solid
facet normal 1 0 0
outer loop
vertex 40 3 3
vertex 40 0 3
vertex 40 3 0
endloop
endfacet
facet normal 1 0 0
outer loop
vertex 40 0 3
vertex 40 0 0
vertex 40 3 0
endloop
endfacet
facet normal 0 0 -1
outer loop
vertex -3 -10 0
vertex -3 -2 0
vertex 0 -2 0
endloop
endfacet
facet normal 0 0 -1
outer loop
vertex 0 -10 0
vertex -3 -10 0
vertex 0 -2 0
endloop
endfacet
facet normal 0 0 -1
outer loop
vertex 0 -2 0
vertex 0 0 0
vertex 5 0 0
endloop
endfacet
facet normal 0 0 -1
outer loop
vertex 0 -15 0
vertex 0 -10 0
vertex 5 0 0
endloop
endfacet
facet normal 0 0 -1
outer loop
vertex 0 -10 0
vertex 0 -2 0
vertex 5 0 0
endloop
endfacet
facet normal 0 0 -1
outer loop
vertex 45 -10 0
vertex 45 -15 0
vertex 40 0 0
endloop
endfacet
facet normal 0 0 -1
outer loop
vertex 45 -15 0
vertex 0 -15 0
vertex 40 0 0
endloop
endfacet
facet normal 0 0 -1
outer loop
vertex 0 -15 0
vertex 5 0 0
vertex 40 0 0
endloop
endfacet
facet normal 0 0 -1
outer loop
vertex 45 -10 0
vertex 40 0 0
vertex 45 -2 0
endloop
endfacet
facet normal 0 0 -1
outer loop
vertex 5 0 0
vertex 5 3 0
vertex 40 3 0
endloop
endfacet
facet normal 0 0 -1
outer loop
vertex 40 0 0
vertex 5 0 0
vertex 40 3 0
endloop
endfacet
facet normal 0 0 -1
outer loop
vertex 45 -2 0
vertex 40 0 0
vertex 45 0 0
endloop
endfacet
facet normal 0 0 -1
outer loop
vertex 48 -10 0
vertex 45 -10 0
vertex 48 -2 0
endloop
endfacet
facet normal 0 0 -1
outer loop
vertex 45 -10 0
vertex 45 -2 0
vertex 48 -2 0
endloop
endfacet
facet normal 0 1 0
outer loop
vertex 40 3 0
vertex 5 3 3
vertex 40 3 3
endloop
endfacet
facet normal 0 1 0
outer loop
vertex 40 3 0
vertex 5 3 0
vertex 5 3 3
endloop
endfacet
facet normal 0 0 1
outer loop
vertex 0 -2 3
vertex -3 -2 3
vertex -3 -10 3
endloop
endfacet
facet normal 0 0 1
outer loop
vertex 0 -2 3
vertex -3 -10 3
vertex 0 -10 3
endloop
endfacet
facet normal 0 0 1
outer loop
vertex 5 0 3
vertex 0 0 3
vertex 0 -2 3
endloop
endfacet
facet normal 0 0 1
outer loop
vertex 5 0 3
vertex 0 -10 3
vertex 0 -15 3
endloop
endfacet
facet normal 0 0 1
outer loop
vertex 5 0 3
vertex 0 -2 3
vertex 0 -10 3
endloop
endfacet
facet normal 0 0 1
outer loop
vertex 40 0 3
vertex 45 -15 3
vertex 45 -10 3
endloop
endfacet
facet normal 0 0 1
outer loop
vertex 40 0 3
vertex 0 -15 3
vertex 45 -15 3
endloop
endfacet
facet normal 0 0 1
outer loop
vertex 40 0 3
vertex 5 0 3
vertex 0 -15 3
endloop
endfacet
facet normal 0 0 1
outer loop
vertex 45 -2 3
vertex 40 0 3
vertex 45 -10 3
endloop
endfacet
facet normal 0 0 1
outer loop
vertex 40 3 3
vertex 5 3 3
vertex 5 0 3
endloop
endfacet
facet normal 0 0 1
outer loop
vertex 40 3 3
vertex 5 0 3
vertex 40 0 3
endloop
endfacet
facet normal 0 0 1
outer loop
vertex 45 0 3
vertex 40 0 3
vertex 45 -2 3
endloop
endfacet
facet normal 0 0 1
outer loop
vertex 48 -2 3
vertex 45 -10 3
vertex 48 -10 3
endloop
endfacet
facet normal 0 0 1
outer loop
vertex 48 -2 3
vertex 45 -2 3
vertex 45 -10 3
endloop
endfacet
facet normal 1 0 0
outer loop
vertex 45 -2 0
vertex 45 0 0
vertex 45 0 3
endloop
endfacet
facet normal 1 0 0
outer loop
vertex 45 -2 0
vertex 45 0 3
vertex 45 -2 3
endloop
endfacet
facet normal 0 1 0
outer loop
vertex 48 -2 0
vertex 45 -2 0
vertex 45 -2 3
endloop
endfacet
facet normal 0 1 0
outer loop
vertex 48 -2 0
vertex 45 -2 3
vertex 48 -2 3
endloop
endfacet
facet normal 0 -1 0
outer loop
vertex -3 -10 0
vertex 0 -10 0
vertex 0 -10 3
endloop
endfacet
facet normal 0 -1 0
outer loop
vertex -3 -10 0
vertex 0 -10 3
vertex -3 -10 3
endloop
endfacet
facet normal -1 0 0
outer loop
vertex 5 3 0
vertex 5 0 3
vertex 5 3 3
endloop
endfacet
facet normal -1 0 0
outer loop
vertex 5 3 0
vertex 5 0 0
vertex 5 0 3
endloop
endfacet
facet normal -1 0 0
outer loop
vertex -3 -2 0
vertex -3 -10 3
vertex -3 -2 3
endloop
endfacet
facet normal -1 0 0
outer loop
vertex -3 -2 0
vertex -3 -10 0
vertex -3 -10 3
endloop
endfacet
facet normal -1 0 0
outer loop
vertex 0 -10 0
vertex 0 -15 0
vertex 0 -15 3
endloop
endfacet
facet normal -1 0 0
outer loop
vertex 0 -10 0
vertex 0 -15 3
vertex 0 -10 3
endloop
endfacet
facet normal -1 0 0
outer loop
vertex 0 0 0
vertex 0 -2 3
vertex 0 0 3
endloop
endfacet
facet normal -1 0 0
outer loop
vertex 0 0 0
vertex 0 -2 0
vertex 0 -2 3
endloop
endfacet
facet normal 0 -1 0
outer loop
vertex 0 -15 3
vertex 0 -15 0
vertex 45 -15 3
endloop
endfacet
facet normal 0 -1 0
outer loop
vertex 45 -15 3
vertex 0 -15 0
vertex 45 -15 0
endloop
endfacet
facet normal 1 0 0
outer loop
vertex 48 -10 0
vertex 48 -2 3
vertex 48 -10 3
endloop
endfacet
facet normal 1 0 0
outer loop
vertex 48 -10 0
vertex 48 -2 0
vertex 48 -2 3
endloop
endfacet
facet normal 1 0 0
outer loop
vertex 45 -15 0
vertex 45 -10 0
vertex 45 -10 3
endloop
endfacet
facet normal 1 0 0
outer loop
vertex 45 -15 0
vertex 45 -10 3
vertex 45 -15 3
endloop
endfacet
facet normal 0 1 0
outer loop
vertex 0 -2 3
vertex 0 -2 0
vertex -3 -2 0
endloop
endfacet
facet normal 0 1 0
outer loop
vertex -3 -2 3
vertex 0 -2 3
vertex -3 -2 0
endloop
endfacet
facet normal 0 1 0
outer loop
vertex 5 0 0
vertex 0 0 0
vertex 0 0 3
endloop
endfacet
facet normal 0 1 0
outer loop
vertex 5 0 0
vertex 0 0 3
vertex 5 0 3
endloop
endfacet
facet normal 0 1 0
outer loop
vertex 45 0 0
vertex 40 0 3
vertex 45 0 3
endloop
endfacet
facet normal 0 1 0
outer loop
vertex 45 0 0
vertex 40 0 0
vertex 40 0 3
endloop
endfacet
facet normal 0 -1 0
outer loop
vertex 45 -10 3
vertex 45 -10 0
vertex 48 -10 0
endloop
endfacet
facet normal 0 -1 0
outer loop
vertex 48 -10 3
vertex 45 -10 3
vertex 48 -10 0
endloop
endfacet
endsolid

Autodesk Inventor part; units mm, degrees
ref_plane "YZ Plane" through (0, 0, 0) normal (1, 0, 0) x (0, 1, 0)
ref_plane "XZ Plane" through (0, 0, 0) normal (0, 1, 0) x (-1, 0, 0)
ref_plane "XY Plane" through (0, 0, 0) normal (0, 0, 1) x (1, 0, 0)
sketch "Sketch1" plane through (0, 0, 0) normal (0, 0, 1) x (1, 0, 0)
  line L0 (5, 0) -> (5, 3) projected
  line L1 (5, 0) -> (40, 0) projected
  line L2 (40, 0) -> (40, 3) projected
  line L3 (5, 3) -> (40, 3) projected
  line L4 (0, 0) -> (5, 0) projected
  line L5 (5, 0) -> (5, 3) projected
  line L6 (0, 3) -> (5, 3) projected
  line L7 (0, 0) -> (0, 3) projected
  line L8 (0, -2) -> (0, 3) projected
  line L9 (0, 3) -> (-3, 3) projected
  line L10 (-3, -2) -> (-3, 3) projected
  line L11 (0, -2) -> (-3, -2) projected
  line L12 (0, -10) -> (-3, -10) projected
  line L13 (0, -10) -> (0, -2) projected
  line L14 (0, -2) -> (-3, -2) projected
  line L15 (-3, -10) -> (-3, -2) projected
  line L16 (0, -15) -> (0, -10) projected
  line L17 (0, -10) -> (-3, -10) projected
  line L18 (-3, -15) -> (-3, -10) projected
  line L19 (0, -15) -> (-3, -15) projected
  line L20 (45, -10) -> (45, -15) projected
  line L21 (45, -15) -> (48, -15) projected
  line L22 (48, -10) -> (48, -15) projected
  line L23 (45, -10) -> (48, -10) projected
  line L24 (45, -2) -> (45, -10) projected
  line L25 (45, -10) -> (48, -10) projected
  line L26 (48, -2) -> (48, -10) projected
  line L27 (45, -2) -> (48, -2) projected
  line L28 (45, 3) -> (45, -2) projected
  line L29 (45, -2) -> (48, -2) projected
  line L30 (48, 3) -> (48, -2) projected
  line L31 (45, 3) -> (48, 3) projected
  line L32 (40, 0) -> (45, 0) projected
  line L33 (45, 0) -> (45, 3) projected
  line L34 (40, 3) -> (45, 3) projected
  line L35 (40, 0) -> (40, 3) projected
  line L36 (0, -15) -> (45, -15)
extrude "Extrusion1" add sketch "Sketch1" along normal blind 3 contours L0 L3 L2 L1 | L1 L32 L28 L24 L20 L36 L16 L13 L8 L4 | L13 L12 L15 L11 | L27 L26 L23 L24
properties part number "SideFaceTopNM" material "Acrylic, Clear"
